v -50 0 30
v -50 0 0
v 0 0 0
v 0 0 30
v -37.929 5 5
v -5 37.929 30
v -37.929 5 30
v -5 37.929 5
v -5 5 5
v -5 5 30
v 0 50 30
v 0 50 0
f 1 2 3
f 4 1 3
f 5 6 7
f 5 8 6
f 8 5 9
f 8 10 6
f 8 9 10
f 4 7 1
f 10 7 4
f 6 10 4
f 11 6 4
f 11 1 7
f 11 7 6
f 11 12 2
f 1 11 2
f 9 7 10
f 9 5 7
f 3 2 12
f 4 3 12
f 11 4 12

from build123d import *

# Parameters (mm, degrees)
F1_DEPTH = 30
F2_T     = -5


with BuildPart() as f1:
    # F0 (on Top) → F1 (new body)
    with BuildSketch(Plane.XY):
        Polygon((0, 50), (-50, 0), (0, 0), align=None)
    extrude(amount=F1_DEPTH)

    # F2
    f2_openings = [f1.faces().sort_by_distance(p)[0] for p in [
        (-16.666667, 16.666667, 30),
    ]]
    offset(amount=F2_T, openings=f2_openings)


solid = f1.part
